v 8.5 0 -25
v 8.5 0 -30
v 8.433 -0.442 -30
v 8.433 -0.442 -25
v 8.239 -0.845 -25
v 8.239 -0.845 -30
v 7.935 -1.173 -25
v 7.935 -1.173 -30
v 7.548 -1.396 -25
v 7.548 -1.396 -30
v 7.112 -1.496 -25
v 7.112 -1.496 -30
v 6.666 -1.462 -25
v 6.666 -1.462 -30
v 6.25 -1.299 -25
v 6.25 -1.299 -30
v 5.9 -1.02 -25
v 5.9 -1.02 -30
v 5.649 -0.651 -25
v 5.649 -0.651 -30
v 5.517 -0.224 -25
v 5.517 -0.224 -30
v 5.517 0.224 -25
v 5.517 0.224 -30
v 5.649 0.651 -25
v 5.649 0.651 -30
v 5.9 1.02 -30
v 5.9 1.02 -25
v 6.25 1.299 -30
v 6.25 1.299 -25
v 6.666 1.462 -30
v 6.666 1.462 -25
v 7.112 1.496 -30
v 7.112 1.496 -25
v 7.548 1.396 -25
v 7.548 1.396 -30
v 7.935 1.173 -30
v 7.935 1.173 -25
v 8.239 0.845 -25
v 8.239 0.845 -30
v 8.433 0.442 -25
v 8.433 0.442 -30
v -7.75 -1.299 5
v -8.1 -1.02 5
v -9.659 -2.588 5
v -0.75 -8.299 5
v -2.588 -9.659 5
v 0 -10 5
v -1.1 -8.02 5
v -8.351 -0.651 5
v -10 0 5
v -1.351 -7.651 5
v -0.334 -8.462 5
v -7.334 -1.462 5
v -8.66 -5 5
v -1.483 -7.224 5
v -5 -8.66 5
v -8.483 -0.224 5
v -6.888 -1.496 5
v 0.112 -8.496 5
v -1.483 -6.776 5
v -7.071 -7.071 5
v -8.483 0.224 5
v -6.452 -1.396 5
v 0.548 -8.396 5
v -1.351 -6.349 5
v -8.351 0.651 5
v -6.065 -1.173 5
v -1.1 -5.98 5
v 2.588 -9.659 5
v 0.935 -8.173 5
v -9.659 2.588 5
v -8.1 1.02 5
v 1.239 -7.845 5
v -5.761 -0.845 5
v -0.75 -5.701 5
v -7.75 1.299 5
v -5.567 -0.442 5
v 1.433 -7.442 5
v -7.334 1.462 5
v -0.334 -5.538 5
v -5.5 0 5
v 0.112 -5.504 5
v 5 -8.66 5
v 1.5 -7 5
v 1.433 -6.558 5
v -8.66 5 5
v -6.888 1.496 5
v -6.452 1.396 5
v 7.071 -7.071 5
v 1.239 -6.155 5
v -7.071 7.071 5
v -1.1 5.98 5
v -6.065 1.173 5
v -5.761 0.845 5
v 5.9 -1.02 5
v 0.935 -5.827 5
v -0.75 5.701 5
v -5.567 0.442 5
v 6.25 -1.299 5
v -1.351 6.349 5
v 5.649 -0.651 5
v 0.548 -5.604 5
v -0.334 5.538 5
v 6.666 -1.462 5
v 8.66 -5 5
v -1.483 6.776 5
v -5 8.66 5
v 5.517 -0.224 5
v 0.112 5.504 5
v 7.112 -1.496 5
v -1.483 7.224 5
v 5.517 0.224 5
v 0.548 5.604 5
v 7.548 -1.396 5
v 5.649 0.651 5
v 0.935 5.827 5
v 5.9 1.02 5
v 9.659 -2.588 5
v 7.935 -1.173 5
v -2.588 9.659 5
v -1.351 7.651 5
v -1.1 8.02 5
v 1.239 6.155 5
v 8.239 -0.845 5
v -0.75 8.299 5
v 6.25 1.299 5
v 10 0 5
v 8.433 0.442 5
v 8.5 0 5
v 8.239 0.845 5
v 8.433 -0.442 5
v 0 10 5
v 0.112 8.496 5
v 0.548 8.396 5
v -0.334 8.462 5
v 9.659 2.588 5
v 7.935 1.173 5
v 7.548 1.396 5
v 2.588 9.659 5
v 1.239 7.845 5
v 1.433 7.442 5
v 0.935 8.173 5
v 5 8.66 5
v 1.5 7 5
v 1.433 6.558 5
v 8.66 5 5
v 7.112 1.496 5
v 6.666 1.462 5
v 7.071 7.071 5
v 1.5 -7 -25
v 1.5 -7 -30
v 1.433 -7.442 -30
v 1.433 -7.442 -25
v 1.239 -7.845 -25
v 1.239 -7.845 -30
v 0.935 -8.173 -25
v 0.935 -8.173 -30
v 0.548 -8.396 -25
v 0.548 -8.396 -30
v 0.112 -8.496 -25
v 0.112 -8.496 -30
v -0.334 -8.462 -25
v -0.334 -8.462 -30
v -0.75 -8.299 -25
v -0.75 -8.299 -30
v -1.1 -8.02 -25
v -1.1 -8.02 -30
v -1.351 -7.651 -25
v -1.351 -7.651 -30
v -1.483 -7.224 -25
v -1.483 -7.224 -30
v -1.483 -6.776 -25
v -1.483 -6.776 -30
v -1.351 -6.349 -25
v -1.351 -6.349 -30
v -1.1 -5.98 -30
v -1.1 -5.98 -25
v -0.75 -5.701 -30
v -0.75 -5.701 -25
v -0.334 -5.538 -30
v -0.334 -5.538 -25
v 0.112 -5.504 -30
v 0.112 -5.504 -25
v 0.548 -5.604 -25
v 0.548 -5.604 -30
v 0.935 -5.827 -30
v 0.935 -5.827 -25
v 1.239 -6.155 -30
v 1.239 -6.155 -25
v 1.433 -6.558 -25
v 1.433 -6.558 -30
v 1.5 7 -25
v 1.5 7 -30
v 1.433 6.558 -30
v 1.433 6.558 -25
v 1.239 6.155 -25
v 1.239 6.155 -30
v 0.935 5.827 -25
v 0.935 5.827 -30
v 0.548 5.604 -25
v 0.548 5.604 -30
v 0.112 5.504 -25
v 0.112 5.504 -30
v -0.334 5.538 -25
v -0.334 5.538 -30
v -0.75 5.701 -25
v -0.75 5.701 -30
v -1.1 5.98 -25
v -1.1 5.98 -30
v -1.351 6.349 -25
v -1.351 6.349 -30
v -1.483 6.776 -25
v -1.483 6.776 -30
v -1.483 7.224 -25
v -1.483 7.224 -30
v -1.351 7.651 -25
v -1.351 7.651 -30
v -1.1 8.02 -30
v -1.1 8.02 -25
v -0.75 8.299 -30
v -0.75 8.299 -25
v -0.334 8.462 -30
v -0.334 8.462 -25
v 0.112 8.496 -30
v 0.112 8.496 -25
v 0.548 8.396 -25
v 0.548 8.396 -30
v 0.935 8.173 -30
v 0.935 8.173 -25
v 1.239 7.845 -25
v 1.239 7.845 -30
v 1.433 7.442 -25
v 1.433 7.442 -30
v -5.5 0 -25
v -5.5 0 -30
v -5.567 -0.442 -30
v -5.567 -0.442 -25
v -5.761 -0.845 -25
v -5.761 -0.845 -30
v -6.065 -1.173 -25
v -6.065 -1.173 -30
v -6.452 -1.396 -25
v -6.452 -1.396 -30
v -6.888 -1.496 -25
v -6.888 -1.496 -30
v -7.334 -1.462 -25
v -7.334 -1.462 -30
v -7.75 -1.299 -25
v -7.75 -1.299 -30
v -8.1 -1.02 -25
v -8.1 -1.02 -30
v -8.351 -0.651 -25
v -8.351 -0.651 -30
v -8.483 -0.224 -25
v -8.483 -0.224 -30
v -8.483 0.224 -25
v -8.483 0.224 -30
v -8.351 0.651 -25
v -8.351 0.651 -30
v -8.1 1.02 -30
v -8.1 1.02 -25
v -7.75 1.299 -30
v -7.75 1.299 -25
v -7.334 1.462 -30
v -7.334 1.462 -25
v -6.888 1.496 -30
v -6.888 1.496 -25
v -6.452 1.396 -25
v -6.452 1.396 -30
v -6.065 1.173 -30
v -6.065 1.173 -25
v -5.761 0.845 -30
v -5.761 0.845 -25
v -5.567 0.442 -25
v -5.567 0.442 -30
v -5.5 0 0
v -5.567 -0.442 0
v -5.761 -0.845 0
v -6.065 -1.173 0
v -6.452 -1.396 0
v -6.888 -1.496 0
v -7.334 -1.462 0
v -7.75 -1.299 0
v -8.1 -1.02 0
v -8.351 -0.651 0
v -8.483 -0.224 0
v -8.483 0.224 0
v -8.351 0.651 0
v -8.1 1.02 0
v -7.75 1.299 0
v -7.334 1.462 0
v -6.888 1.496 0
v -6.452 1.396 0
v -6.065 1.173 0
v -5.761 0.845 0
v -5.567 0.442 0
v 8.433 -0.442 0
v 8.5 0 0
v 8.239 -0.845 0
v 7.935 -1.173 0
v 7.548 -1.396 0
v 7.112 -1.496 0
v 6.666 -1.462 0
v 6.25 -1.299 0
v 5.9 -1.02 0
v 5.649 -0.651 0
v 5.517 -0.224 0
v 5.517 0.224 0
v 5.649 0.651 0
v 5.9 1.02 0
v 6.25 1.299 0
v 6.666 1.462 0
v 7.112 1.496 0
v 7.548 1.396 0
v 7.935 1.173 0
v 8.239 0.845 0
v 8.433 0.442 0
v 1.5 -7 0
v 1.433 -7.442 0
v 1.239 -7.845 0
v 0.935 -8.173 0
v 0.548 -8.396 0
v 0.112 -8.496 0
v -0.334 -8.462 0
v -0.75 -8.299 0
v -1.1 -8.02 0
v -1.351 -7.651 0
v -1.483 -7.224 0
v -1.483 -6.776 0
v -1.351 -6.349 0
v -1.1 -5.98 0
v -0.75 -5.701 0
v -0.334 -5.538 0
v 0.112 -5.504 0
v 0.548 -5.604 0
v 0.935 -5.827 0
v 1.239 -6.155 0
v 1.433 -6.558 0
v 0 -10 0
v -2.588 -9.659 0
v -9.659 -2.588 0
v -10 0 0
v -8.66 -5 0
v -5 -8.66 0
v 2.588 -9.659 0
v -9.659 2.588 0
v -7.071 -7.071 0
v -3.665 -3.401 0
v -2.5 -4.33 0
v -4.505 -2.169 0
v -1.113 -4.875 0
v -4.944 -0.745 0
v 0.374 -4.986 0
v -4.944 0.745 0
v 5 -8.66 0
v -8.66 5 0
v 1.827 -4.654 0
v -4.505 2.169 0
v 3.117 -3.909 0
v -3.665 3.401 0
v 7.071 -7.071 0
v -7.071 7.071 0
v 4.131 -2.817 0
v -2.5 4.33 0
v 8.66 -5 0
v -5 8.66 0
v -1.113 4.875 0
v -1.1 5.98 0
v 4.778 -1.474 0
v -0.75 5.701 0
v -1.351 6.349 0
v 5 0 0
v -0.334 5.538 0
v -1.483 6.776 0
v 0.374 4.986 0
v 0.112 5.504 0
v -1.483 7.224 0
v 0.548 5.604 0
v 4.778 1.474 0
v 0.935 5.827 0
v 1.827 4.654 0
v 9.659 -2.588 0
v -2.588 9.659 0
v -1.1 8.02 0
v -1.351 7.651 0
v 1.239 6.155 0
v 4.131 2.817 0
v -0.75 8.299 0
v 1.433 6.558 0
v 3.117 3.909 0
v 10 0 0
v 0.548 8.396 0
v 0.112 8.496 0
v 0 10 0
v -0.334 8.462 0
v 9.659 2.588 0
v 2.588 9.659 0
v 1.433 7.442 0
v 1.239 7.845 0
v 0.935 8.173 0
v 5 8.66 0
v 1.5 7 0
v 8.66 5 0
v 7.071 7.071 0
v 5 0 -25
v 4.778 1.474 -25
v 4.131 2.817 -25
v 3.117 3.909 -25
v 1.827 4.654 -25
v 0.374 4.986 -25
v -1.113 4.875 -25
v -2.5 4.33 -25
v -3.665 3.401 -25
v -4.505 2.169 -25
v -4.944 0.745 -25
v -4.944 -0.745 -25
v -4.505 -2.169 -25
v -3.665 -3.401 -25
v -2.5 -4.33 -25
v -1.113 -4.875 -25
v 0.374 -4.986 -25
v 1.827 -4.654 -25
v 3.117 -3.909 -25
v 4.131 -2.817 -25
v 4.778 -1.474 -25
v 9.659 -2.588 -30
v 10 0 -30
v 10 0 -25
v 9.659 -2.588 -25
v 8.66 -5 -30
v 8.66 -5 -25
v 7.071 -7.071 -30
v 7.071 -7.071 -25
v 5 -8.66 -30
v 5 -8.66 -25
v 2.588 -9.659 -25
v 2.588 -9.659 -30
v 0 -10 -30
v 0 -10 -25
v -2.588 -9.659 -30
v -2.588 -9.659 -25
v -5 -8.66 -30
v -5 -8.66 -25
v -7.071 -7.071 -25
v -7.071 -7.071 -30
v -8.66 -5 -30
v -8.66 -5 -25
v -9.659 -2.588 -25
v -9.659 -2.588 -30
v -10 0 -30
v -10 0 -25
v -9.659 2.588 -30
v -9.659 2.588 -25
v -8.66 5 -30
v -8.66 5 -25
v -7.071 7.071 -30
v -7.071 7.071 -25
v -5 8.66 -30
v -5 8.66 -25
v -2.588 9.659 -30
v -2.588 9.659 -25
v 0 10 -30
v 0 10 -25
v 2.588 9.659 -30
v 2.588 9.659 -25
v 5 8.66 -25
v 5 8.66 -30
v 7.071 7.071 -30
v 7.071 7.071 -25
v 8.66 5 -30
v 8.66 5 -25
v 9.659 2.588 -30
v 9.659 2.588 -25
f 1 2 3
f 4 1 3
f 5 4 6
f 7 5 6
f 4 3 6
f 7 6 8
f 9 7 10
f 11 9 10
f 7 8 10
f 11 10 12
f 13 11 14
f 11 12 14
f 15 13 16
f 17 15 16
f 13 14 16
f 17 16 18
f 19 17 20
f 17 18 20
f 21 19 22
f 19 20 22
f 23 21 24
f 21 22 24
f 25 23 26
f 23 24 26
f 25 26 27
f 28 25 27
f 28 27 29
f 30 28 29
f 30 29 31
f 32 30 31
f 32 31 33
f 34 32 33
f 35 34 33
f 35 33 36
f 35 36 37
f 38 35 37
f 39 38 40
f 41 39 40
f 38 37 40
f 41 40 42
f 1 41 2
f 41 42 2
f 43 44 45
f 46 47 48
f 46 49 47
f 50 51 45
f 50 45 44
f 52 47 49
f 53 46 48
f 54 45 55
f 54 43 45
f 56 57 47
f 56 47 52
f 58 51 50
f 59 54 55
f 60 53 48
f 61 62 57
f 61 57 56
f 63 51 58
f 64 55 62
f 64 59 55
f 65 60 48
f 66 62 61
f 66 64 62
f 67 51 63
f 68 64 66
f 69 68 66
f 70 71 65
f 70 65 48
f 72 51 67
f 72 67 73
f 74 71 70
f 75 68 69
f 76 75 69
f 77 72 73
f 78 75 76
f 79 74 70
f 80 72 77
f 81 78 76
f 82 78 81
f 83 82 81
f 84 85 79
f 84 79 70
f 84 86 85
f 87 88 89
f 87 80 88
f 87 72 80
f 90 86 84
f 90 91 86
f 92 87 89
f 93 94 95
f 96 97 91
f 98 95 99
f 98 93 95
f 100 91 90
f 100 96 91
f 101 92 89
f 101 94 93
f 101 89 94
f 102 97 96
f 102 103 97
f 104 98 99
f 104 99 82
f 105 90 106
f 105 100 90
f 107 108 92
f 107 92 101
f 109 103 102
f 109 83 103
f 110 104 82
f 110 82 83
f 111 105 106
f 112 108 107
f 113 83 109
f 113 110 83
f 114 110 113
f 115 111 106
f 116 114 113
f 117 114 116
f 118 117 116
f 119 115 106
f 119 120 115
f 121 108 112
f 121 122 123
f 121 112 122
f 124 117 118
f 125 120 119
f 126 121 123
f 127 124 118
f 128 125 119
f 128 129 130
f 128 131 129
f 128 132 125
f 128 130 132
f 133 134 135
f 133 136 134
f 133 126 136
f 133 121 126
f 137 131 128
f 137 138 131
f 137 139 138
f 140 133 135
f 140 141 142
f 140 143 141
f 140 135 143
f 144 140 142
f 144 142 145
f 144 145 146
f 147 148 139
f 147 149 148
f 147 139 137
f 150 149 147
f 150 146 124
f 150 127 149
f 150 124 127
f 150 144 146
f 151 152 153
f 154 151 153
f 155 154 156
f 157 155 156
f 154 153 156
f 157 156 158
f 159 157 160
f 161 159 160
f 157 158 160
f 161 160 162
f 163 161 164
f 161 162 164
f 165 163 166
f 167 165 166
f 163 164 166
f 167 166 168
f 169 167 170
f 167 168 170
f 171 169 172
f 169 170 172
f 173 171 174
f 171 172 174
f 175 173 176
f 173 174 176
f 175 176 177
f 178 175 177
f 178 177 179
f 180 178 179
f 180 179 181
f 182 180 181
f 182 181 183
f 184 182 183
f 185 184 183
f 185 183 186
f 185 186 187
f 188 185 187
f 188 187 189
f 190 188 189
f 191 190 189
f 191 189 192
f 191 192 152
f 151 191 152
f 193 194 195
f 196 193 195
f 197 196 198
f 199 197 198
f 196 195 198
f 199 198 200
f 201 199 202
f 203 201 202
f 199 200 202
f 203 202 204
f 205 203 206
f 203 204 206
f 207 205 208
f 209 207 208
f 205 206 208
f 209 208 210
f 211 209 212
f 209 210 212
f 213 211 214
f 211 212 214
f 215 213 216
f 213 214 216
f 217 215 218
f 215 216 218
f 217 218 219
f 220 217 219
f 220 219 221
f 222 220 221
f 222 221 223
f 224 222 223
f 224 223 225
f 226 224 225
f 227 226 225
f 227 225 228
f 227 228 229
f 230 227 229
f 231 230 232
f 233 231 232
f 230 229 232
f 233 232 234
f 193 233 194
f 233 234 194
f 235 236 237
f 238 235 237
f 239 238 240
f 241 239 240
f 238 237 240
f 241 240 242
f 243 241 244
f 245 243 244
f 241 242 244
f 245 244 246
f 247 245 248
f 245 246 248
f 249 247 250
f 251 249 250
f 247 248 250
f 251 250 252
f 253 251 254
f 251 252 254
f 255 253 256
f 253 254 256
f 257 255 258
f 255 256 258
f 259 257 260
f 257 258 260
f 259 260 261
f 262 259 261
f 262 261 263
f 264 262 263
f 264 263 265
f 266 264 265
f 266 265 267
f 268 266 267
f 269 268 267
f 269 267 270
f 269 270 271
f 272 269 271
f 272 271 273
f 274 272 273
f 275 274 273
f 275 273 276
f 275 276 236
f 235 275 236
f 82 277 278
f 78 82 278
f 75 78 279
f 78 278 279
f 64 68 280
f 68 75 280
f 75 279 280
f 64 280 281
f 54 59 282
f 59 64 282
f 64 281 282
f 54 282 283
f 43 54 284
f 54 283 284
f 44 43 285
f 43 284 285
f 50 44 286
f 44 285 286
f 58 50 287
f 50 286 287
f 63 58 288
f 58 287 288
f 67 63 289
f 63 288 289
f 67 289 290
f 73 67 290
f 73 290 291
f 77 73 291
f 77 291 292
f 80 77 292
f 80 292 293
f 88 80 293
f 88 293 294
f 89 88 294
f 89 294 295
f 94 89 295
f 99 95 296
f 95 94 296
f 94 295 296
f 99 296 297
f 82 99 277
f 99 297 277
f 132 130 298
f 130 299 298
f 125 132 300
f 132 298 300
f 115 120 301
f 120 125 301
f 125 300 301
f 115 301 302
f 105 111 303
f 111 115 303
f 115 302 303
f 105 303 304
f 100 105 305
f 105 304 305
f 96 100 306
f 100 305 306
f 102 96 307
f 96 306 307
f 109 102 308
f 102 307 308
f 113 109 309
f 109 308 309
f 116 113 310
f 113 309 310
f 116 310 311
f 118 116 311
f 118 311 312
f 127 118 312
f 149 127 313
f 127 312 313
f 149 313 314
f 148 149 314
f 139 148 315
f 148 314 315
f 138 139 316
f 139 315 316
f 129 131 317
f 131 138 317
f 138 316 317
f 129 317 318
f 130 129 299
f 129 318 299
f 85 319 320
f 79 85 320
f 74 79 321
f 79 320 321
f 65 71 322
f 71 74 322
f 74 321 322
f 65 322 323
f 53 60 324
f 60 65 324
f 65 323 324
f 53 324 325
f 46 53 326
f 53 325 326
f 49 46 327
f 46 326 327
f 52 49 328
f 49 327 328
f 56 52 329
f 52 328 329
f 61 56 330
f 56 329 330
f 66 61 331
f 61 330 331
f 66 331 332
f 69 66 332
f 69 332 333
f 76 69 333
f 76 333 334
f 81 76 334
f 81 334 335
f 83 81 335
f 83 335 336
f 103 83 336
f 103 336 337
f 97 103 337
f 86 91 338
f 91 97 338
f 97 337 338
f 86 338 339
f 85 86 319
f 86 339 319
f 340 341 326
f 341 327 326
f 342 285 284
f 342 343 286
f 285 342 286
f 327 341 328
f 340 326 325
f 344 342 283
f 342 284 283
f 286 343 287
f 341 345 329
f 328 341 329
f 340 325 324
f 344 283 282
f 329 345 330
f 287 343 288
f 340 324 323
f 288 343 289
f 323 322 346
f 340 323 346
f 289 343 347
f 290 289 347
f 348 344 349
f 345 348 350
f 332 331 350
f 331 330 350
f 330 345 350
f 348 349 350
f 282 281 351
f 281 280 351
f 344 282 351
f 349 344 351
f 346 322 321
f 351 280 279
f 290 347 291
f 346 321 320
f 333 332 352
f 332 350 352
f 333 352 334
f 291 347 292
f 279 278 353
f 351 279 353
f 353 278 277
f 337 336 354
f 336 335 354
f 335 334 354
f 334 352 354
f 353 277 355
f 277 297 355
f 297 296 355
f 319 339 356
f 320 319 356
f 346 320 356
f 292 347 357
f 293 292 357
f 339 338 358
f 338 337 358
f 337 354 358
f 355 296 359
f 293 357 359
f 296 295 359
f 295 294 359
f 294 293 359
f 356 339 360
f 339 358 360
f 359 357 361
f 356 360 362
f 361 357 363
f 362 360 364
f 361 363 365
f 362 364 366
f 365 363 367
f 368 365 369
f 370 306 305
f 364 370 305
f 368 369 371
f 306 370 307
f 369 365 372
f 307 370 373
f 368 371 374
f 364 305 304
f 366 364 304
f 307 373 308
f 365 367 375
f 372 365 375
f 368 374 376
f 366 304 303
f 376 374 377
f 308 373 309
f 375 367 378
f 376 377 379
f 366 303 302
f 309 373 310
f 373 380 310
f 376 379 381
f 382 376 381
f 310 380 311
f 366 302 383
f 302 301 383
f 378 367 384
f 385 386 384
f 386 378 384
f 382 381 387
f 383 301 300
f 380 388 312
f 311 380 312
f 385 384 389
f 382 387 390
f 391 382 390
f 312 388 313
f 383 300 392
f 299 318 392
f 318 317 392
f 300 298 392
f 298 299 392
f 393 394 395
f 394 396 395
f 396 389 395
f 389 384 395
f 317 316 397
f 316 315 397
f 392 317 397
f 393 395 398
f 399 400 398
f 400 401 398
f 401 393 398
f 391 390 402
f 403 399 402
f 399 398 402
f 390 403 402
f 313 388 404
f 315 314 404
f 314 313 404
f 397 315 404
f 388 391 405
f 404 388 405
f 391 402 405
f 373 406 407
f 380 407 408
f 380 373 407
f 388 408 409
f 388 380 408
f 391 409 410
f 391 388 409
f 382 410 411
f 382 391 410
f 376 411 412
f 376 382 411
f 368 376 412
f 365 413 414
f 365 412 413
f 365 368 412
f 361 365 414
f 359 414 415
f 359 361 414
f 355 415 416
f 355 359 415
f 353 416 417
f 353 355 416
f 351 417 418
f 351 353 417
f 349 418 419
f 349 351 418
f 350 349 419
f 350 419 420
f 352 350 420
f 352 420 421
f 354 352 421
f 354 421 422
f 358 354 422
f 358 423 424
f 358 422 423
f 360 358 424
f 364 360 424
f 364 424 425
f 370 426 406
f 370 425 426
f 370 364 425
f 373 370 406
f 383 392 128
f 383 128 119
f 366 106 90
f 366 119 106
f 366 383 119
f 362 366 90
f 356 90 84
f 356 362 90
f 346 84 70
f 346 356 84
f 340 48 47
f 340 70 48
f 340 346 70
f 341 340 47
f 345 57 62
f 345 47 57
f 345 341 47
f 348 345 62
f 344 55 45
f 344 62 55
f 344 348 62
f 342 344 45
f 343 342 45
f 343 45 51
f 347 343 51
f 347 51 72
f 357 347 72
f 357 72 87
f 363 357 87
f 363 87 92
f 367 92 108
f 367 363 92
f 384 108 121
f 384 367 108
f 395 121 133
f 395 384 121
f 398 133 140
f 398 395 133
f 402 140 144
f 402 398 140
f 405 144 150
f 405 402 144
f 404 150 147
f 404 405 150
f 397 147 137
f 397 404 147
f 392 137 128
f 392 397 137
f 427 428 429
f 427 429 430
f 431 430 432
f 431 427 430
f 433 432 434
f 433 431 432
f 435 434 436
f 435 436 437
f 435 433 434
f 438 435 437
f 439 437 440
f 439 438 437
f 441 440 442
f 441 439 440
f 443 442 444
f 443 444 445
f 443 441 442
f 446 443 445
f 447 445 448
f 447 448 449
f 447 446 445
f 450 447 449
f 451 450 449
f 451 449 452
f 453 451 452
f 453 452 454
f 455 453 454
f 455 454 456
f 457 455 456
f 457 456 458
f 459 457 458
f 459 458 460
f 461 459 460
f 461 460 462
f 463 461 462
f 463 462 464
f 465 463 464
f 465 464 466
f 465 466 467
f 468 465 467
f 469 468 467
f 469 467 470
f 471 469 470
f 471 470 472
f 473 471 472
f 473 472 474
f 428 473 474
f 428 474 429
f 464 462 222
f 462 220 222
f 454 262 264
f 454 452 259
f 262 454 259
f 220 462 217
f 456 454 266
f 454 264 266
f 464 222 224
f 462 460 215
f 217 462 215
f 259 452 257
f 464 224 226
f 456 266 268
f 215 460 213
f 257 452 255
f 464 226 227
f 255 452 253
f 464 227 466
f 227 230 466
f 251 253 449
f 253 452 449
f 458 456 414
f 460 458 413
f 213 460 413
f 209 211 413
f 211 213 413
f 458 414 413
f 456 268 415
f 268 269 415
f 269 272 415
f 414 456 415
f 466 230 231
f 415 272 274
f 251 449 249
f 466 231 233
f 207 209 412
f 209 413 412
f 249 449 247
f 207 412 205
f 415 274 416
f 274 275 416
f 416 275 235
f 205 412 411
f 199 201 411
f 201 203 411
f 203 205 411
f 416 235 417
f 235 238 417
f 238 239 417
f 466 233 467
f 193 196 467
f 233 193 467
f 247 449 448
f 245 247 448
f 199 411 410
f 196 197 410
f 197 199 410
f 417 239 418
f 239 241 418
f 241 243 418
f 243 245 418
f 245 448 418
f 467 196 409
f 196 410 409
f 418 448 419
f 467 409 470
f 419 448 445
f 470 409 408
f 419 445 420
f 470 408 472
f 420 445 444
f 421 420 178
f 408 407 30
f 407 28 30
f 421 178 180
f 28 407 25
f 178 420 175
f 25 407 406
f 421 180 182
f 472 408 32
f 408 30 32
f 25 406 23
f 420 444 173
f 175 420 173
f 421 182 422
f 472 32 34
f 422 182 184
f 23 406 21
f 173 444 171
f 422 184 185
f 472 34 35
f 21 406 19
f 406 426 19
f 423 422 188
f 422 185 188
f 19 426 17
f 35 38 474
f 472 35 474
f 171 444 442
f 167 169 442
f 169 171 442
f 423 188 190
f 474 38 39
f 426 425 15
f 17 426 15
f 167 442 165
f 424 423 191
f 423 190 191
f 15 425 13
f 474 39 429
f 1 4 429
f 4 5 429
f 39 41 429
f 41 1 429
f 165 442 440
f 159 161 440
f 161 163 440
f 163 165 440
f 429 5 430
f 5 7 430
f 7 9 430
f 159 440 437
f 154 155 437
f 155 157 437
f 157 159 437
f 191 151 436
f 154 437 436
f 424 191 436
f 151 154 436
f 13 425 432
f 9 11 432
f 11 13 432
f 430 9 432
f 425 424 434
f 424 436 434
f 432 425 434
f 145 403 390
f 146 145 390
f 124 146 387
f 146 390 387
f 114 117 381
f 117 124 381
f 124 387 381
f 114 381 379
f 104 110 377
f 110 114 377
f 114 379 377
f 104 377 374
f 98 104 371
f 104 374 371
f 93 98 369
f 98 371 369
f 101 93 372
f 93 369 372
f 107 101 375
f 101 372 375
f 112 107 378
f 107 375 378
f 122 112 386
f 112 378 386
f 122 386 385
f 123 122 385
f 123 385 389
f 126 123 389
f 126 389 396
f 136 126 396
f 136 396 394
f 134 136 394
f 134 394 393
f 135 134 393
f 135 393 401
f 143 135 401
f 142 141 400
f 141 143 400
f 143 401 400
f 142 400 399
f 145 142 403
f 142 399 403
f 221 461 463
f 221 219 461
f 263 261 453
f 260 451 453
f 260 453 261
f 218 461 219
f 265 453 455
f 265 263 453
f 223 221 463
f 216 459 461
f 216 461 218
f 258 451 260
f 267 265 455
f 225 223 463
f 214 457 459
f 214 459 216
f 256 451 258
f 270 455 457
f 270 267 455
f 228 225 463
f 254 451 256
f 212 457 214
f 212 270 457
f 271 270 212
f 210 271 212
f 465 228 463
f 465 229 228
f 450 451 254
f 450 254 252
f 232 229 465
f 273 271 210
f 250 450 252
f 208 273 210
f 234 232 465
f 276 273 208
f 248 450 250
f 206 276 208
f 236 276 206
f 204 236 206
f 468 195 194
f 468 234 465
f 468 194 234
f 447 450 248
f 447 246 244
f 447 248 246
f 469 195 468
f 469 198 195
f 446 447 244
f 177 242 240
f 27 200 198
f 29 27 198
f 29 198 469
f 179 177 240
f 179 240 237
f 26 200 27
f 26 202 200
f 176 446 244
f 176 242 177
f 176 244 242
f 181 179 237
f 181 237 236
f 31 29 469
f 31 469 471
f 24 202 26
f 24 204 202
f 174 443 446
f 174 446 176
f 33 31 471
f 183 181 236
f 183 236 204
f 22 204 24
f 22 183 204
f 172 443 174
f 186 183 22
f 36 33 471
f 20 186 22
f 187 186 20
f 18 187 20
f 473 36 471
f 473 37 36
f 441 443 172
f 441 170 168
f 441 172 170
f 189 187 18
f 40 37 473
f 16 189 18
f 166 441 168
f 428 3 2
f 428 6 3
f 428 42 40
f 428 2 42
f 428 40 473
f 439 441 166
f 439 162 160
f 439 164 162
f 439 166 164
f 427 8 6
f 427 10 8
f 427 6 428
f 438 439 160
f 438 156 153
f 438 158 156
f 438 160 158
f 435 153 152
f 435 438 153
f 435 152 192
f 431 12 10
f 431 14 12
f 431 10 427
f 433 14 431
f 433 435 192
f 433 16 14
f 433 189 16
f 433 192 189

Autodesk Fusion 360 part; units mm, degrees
sketch "Sketch1" plane through (0, 0, 0) normal (0, 0, 1) x (1, 0, 0)
  circle A0 centre (0, 0) radius 7 construction
  circle A1 centre (-7, 0) radius 1.5
  circle A2 centre (0, 7) radius 1.5
  circle A3 centre (7, 0) radius 1.5
  circle A4 centre (0, -7) radius 1.5
  circle A5 centre (0, 0) radius 10
  circle A6 centre (0, 0) radius 5
  dimension "d5" = 360
  dimension "d7" = 14
  dimension "d8" = 3
  dimension "d11" = 20
  dimension "d15" = 10
extrude "Extrude1" add sketch "Sketch1" along normal blind 5 contours A5 | A6
extrude "Extrude2" add sketch "Sketch1" against normal blind 30 contours A6
sketch "Sketch3" plane through (0, 0, -30) normal (0, 0, -1) x (1, 0, 0)
  circle A0 centre (0, 0) radius 5
  circle A1 centre (0, 7) radius 1.5
  circle A2 centre (0, 0) radius 5
  circle A3 centre (0, 0) radius 7 construction
  circle A4 centre (-7, 0) radius 1.5
  circle A5 centre (0, -7) radius 1.5
  circle A6 centre (7, 0) radius 1.5
  circle A7 centre (0, 0) radius 10
  dimension "d20" = 360
  dimension "d21" = 14
  dimension "d22" = 3
  dimension "d23" = 20
  dimension "d24" = 10
extrude "Extrude4" add sketch "Sketch3" against normal blind 5
equation "outer_radius = 20 mm"
equation "radius_thickness = 5 mm"
equation "d11 = outer_radius"
equation "d12 = radius_thickness"
equation "inner_radius = 10 mm"
equation "d15 = inner_radius"
equation "tot_height = 35 mm"
equation "d17 = -tot_height + radius_thickness"
equation "d23 = outer_radius"
equation "d24 = inner_radius"
equation "d27 = -radius_thickness"
